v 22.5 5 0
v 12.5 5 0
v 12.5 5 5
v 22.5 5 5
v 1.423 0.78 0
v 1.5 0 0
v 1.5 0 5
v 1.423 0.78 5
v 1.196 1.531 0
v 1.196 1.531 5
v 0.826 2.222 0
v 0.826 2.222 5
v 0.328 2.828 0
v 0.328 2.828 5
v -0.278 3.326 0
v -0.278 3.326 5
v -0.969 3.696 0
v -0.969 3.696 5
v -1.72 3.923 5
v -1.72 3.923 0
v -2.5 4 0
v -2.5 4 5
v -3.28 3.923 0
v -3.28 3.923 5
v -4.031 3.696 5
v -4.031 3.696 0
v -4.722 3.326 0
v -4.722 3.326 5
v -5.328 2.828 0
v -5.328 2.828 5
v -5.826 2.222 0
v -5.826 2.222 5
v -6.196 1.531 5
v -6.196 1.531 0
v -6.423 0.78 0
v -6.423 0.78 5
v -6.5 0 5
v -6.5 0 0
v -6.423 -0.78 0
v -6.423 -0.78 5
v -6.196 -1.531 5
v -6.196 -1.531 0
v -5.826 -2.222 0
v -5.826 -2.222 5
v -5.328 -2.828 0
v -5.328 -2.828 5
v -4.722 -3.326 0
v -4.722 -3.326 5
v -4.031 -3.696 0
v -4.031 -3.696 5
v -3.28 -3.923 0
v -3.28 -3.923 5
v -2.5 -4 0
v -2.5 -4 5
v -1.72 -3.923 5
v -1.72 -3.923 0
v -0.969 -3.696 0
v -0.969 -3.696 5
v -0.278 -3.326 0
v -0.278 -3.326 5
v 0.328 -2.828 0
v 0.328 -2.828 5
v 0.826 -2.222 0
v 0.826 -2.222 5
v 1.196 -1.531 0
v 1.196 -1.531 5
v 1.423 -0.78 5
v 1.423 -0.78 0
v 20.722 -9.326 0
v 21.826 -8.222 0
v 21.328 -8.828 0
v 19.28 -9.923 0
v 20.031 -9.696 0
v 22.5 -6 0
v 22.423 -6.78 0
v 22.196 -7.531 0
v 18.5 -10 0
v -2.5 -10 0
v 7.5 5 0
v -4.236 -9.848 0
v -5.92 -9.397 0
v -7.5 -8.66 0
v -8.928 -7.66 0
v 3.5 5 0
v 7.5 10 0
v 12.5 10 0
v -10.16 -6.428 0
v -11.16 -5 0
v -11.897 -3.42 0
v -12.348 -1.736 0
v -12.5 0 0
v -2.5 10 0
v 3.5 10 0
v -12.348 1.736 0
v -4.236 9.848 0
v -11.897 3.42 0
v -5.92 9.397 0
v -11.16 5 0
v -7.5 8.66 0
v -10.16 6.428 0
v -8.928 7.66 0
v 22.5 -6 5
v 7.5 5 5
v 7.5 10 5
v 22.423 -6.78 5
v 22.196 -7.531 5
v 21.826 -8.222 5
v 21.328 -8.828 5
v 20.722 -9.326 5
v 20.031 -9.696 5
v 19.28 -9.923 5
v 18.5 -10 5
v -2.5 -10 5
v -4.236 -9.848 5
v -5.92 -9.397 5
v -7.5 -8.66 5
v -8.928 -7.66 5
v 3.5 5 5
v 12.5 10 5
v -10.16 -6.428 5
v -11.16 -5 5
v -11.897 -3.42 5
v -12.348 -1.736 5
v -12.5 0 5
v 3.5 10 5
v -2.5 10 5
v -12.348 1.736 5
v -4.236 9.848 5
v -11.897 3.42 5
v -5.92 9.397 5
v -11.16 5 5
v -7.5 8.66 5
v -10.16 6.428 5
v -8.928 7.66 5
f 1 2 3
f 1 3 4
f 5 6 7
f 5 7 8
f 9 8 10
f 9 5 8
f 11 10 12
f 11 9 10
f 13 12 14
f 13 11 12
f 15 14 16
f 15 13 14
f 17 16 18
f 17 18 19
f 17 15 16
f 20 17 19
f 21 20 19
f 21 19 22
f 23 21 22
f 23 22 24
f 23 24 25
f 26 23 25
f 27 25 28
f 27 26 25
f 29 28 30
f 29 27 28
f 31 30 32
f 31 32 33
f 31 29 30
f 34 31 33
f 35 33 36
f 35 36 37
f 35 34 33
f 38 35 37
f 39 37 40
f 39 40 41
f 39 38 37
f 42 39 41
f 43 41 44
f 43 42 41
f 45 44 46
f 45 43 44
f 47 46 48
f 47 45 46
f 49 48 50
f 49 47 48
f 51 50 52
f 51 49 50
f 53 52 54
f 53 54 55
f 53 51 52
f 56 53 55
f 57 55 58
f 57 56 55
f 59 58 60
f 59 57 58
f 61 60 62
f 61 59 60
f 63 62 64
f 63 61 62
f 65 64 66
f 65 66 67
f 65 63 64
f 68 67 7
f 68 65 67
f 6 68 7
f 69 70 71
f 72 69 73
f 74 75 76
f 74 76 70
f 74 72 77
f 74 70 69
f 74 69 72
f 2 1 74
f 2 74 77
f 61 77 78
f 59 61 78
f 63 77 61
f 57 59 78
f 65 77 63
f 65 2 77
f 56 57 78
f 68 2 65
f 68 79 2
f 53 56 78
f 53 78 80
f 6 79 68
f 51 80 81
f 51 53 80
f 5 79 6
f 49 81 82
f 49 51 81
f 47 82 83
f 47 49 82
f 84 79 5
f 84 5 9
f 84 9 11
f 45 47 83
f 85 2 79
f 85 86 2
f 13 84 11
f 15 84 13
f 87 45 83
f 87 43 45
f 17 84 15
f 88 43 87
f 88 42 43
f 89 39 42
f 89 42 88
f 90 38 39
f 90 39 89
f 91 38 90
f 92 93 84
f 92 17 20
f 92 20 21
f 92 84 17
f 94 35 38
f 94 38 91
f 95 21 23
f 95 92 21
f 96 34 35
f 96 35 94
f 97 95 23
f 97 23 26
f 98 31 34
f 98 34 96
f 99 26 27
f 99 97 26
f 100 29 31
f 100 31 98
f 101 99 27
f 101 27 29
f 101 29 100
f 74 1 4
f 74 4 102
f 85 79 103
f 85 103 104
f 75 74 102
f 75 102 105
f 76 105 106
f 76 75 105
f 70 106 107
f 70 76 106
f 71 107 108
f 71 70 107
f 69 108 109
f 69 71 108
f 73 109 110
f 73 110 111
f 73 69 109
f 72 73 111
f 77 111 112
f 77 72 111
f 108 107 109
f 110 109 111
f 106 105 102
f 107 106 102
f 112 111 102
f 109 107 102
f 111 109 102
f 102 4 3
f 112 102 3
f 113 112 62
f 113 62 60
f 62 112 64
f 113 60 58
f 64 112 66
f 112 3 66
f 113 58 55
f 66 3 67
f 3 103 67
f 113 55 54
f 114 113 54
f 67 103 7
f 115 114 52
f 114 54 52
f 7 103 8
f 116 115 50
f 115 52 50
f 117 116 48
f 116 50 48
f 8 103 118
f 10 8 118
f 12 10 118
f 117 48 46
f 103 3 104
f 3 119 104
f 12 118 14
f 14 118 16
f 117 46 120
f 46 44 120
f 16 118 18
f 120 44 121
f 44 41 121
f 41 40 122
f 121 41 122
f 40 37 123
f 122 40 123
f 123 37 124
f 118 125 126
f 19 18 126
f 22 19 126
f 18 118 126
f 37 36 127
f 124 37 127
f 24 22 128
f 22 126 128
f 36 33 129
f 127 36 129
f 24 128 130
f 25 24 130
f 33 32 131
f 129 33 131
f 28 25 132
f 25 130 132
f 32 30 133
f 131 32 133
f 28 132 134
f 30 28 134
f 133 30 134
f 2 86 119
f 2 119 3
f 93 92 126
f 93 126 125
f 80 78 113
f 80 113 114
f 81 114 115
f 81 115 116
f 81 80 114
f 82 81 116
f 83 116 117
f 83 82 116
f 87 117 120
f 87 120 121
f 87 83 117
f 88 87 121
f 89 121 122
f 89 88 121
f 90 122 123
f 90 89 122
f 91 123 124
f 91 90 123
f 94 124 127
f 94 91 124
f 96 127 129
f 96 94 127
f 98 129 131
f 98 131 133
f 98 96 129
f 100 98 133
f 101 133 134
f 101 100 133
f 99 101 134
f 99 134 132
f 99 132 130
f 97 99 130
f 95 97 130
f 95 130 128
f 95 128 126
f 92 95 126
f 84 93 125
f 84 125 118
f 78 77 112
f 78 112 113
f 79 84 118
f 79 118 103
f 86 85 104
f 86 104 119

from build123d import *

# Parameters (mm, degrees)
SKETCH1_R           = 4
BOSS_EXTRUDE4_DEPTH = 5


with BuildPart() as part:
    # Sketch1 → Boss-Extrude4 (new body)
    with BuildSketch(Plane.XY):
        with BuildLine():
            Line((22.5, 5), (22.5, -6))
            ThreePointArc((22.5, -6), (21.328427125, -8.828427125), (18.5, -10))
            Line((18.5, -10), (-2.5, -10))
            ThreePointArc((-2.5, -10), (-12.5, 0), (-2.5, 10))
            Line((-2.5, 10), (3.5, 10))
            Line((3.5, 10), (3.5, 5))
            Line((3.5, 5), (7.5, 5))
            Line((7.5, 5), (7.5, 10))
            Line((7.5, 10), (12.5, 10))
            Line((12.5, 10), (12.5, 5))
            Line((12.5, 5), (22.5, 5))
        make_face()
        with Locations((-2.5, 0)):
            Circle(SKETCH1_R, mode=Mode.SUBTRACT)
    extrude(amount=BOSS_EXTRUDE4_DEPTH)


solid = part.part
